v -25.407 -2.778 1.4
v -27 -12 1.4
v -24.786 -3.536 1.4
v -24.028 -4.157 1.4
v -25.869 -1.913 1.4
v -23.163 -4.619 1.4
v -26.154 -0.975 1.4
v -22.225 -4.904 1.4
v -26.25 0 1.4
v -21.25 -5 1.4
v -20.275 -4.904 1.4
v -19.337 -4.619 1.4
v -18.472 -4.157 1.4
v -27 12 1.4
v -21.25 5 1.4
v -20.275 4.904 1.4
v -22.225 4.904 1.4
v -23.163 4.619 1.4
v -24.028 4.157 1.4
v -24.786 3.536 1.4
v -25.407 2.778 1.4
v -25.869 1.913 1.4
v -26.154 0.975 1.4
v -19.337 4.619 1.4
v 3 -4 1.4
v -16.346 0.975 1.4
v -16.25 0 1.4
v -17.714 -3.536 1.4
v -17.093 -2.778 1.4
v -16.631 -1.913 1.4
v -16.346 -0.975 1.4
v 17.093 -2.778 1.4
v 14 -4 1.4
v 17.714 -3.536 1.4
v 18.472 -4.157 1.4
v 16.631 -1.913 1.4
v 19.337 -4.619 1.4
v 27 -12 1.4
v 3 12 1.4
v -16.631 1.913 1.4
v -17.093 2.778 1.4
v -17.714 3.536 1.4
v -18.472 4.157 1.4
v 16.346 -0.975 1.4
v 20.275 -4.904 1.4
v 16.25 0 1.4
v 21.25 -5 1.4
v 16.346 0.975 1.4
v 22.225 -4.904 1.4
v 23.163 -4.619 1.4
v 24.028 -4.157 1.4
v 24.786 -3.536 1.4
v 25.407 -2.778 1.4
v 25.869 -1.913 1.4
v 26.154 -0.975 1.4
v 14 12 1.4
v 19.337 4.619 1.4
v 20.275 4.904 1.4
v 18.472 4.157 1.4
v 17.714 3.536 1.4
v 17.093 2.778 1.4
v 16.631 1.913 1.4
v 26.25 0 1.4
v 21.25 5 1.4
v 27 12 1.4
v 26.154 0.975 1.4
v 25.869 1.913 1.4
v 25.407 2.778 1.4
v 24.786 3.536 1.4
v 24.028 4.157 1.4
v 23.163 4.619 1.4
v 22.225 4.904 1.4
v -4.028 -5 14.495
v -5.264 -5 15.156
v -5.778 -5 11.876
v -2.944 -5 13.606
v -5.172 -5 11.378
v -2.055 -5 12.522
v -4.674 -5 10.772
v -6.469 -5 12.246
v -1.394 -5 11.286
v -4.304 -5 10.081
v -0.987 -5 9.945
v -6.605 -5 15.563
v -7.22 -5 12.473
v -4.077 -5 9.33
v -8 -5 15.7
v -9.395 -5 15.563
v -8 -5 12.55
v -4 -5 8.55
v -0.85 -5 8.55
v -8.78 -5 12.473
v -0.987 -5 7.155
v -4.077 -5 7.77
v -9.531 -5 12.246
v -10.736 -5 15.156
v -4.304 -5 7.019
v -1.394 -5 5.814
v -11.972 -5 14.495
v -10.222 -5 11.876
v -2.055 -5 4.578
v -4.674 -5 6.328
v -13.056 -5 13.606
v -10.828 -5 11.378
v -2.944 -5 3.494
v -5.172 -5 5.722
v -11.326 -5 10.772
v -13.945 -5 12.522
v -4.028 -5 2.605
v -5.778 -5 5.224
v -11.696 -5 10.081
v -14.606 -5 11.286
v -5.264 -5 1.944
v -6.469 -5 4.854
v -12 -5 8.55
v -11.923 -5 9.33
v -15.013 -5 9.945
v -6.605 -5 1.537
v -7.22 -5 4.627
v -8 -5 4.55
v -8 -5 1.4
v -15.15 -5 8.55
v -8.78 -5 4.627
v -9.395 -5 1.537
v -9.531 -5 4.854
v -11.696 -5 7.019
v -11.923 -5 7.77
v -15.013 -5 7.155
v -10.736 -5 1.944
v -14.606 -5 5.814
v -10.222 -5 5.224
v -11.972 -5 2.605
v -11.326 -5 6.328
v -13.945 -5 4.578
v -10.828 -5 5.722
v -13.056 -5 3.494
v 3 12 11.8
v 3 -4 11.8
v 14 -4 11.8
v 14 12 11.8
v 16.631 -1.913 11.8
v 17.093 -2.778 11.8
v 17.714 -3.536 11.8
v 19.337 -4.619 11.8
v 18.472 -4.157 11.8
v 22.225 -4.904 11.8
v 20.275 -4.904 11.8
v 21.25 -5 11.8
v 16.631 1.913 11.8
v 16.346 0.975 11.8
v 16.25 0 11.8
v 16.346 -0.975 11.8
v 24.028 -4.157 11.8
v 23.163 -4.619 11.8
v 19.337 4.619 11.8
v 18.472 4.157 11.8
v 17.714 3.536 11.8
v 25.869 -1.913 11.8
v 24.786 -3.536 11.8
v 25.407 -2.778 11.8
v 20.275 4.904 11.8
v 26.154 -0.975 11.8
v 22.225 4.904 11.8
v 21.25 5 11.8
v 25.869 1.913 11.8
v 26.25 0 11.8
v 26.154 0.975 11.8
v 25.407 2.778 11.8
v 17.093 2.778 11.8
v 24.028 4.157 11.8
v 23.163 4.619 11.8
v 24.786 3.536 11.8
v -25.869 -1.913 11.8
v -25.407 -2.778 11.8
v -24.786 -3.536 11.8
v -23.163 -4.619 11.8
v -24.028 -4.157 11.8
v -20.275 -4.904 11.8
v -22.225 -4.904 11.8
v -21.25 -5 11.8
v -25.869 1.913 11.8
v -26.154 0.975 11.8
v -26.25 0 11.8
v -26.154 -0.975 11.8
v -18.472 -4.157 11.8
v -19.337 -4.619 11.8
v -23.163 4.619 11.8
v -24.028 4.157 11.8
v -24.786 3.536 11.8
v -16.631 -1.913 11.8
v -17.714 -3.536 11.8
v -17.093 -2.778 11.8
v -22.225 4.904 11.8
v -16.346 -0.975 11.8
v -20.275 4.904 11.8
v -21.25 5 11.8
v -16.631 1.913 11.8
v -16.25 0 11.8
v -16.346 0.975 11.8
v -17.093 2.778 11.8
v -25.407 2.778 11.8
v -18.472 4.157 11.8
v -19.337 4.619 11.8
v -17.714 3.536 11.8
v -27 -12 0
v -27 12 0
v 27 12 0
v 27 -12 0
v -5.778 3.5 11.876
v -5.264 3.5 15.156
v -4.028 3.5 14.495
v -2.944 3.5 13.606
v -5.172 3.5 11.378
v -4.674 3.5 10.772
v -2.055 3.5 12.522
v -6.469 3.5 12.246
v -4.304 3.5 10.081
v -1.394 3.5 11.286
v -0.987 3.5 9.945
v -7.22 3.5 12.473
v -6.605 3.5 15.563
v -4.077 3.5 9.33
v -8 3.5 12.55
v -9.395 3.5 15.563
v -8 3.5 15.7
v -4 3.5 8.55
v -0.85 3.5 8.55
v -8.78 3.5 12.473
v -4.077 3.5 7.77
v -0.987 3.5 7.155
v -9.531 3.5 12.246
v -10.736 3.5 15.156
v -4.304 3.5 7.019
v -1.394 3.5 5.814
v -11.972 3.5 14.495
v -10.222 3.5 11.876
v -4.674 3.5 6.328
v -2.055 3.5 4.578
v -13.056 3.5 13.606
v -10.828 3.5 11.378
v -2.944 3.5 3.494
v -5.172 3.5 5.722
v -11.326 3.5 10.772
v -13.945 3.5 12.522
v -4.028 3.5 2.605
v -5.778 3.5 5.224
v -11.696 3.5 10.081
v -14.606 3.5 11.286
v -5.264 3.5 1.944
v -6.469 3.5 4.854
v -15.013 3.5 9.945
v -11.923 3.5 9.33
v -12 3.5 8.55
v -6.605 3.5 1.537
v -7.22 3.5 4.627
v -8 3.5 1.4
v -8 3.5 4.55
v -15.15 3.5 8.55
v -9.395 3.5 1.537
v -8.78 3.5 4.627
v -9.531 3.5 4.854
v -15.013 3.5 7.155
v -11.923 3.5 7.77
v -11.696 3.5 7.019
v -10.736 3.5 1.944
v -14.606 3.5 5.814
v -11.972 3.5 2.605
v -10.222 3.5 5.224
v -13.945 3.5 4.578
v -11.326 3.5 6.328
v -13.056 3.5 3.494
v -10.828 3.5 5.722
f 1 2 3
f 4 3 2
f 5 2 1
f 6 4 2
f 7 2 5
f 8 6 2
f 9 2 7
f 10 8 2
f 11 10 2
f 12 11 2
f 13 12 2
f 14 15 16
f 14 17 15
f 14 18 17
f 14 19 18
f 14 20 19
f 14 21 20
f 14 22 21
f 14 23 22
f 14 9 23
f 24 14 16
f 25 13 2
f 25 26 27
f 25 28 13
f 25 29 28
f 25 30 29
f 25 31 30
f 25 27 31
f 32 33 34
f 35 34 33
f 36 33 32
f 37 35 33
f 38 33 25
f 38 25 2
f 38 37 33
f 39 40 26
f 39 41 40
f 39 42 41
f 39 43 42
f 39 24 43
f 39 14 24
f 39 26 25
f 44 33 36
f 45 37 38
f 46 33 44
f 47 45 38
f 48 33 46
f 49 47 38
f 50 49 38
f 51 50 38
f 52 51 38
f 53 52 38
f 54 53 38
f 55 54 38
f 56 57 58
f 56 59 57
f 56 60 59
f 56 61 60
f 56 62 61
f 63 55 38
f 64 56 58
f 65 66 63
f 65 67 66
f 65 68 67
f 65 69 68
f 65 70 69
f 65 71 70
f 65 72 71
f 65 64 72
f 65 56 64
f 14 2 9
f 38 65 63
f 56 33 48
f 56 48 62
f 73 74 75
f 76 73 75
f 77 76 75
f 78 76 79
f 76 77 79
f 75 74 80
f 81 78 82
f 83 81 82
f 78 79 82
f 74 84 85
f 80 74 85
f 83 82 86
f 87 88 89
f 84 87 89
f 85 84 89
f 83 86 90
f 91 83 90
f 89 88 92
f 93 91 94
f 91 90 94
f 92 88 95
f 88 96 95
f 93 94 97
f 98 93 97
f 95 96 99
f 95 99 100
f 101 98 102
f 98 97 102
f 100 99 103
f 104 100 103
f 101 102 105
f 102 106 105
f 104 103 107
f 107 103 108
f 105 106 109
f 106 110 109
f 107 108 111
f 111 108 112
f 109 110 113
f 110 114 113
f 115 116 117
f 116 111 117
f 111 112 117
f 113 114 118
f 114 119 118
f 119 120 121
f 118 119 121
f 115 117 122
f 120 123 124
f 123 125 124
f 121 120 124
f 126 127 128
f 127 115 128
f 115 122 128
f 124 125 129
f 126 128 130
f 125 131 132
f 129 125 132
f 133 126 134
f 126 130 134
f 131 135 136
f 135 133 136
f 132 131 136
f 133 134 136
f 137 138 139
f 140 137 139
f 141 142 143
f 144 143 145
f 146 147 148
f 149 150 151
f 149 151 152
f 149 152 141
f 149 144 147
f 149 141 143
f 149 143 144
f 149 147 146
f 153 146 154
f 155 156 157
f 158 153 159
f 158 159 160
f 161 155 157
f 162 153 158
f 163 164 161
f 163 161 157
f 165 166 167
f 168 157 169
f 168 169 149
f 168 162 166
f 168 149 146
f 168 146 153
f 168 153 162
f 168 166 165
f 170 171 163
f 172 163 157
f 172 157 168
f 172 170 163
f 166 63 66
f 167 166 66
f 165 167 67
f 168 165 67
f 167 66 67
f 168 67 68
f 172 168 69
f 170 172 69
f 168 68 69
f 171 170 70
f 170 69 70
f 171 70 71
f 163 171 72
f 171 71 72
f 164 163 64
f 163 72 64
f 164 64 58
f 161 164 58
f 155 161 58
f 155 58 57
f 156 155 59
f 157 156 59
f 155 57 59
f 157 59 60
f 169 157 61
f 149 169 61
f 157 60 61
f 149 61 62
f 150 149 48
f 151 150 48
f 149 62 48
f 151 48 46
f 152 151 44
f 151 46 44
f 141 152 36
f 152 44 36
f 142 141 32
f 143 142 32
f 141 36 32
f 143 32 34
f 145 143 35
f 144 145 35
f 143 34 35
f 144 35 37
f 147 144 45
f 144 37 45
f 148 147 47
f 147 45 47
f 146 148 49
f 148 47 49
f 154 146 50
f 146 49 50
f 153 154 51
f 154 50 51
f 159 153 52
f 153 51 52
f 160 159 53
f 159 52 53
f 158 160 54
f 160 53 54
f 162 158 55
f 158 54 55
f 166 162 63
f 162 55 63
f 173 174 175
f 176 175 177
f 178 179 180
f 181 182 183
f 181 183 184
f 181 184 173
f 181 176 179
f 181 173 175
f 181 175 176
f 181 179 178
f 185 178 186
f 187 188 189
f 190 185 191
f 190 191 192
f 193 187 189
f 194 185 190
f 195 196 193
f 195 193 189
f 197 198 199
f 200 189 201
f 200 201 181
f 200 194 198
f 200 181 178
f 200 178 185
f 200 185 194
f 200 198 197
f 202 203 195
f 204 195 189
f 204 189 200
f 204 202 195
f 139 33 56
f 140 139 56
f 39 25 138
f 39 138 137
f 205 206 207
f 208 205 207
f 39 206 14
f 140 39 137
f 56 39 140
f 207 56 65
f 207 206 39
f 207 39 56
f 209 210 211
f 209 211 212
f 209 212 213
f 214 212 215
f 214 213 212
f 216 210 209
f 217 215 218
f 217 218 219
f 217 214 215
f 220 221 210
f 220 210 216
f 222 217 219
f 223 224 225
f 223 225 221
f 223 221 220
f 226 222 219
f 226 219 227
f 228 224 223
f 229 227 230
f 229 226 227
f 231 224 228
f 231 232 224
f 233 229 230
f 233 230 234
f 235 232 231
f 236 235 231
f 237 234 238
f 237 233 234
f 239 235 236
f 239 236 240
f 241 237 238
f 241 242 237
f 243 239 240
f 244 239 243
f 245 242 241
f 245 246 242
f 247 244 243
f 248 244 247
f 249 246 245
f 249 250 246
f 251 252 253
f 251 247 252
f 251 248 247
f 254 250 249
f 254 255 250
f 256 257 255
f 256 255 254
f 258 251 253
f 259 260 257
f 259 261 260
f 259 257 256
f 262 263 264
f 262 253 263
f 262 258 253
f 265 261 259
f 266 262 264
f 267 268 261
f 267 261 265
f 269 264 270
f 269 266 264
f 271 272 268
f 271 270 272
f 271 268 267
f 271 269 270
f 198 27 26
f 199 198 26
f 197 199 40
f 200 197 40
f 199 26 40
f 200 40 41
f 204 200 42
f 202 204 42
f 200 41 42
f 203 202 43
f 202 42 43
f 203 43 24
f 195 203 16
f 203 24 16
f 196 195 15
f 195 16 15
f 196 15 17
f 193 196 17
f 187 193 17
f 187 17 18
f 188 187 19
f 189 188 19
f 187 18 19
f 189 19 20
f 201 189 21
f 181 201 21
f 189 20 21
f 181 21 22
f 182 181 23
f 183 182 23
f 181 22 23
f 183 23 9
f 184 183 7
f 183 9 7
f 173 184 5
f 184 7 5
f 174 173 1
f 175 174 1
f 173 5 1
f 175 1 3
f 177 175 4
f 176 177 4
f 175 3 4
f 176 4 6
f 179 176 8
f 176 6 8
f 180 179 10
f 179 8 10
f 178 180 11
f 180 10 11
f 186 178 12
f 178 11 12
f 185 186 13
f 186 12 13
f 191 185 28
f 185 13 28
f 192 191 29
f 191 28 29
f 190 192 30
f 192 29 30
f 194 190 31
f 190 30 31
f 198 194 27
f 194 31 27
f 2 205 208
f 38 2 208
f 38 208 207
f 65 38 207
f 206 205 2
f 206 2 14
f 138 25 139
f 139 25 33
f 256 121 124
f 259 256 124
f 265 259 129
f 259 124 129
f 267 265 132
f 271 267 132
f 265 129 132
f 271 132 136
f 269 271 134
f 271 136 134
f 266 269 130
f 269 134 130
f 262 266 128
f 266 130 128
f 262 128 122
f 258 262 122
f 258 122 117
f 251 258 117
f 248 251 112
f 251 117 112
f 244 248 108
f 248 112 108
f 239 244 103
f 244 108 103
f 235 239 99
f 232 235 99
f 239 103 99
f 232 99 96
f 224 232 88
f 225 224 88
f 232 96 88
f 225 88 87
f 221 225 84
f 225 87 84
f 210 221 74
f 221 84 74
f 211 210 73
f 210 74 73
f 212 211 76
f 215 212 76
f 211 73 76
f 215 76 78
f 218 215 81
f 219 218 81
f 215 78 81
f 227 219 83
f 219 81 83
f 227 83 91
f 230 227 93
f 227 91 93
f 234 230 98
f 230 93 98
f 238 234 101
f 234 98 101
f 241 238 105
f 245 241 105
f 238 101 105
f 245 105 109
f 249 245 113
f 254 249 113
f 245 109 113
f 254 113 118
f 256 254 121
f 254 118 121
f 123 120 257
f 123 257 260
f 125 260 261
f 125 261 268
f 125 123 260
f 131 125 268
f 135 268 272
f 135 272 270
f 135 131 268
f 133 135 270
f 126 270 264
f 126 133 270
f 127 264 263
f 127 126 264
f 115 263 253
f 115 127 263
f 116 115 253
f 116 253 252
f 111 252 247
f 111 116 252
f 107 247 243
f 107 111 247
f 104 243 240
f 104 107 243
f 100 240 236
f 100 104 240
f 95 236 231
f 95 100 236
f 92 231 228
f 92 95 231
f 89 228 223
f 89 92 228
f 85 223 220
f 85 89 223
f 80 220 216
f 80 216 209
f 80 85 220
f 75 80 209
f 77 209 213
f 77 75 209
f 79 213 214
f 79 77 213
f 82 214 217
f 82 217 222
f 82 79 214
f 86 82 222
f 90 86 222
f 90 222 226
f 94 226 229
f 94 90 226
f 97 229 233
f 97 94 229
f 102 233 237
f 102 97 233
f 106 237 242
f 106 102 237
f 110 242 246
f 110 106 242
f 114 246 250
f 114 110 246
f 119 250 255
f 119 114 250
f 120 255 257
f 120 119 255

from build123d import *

# Parameters (mm, degrees)
ESBO_O1_W                     = 54
ESBO_O1_H                     = 24
RESSALTO_EXTRUS_O1_DEPTH      = 1.4
ESBO_O2_R                     = 5
ESBO_O2_W                     = 11
ESBO_O2_H                     = 16
RESSALTO_EXTRUS_O2_DEPTH      = 10.4
RESSALTO_EXTRUS_O3_DEPTH      = 3.5
RESSALTO_EXTRUS_O3_DEPTH_BACK = 5
ESBO_O4_R                     = 7.15
ESBO_O4_R_2                   = 4


with BuildPart() as part:
    # Esboço1 → Ressalto-extrusão1 (new body)
    with BuildSketch(Plane.XY):
        Rectangle(ESBO_O1_W, ESBO_O1_H)
    extrude(amount=RESSALTO_EXTRUS_O1_DEPTH)

    # Esboço2 → Ressalto-extrusão2 (add)
    with BuildSketch(Plane.XY.offset(1.4)):
        with Locations((21.25, 0)):
            Circle(ESBO_O2_R)
        with Locations((-21.25, 0)):
            Circle(ESBO_O2_R)
        with Locations((8.5, 4)):
            Rectangle(ESBO_O2_W, ESBO_O2_H)
    extrude(amount=RESSALTO_EXTRUS_O2_DEPTH)


with BuildPart() as body_2:
    # Esboço4 → Ressalto-extrusão3 (new, two sides: drawn at the far end of the back side and taken through both)
    with BuildSketch(Plane(origin=(0, 0, 0), x_dir=(1, 0, 0), z_dir=(0, 1, 0)).offset(-RESSALTO_EXTRUS_O3_DEPTH_BACK)):
        with Locations(Location((-8, -8.55, 0), (0, 0, 90))):
            Circle(ESBO_O4_R)
        with Locations(Location((-8, -8.55, 0), (0, 0, 90))):
            Circle(ESBO_O4_R_2, mode=Mode.SUBTRACT)
    extrude(amount=RESSALTO_EXTRUS_O3_DEPTH + RESSALTO_EXTRUS_O3_DEPTH_BACK)


solid = Compound([part.part, body_2.part])
